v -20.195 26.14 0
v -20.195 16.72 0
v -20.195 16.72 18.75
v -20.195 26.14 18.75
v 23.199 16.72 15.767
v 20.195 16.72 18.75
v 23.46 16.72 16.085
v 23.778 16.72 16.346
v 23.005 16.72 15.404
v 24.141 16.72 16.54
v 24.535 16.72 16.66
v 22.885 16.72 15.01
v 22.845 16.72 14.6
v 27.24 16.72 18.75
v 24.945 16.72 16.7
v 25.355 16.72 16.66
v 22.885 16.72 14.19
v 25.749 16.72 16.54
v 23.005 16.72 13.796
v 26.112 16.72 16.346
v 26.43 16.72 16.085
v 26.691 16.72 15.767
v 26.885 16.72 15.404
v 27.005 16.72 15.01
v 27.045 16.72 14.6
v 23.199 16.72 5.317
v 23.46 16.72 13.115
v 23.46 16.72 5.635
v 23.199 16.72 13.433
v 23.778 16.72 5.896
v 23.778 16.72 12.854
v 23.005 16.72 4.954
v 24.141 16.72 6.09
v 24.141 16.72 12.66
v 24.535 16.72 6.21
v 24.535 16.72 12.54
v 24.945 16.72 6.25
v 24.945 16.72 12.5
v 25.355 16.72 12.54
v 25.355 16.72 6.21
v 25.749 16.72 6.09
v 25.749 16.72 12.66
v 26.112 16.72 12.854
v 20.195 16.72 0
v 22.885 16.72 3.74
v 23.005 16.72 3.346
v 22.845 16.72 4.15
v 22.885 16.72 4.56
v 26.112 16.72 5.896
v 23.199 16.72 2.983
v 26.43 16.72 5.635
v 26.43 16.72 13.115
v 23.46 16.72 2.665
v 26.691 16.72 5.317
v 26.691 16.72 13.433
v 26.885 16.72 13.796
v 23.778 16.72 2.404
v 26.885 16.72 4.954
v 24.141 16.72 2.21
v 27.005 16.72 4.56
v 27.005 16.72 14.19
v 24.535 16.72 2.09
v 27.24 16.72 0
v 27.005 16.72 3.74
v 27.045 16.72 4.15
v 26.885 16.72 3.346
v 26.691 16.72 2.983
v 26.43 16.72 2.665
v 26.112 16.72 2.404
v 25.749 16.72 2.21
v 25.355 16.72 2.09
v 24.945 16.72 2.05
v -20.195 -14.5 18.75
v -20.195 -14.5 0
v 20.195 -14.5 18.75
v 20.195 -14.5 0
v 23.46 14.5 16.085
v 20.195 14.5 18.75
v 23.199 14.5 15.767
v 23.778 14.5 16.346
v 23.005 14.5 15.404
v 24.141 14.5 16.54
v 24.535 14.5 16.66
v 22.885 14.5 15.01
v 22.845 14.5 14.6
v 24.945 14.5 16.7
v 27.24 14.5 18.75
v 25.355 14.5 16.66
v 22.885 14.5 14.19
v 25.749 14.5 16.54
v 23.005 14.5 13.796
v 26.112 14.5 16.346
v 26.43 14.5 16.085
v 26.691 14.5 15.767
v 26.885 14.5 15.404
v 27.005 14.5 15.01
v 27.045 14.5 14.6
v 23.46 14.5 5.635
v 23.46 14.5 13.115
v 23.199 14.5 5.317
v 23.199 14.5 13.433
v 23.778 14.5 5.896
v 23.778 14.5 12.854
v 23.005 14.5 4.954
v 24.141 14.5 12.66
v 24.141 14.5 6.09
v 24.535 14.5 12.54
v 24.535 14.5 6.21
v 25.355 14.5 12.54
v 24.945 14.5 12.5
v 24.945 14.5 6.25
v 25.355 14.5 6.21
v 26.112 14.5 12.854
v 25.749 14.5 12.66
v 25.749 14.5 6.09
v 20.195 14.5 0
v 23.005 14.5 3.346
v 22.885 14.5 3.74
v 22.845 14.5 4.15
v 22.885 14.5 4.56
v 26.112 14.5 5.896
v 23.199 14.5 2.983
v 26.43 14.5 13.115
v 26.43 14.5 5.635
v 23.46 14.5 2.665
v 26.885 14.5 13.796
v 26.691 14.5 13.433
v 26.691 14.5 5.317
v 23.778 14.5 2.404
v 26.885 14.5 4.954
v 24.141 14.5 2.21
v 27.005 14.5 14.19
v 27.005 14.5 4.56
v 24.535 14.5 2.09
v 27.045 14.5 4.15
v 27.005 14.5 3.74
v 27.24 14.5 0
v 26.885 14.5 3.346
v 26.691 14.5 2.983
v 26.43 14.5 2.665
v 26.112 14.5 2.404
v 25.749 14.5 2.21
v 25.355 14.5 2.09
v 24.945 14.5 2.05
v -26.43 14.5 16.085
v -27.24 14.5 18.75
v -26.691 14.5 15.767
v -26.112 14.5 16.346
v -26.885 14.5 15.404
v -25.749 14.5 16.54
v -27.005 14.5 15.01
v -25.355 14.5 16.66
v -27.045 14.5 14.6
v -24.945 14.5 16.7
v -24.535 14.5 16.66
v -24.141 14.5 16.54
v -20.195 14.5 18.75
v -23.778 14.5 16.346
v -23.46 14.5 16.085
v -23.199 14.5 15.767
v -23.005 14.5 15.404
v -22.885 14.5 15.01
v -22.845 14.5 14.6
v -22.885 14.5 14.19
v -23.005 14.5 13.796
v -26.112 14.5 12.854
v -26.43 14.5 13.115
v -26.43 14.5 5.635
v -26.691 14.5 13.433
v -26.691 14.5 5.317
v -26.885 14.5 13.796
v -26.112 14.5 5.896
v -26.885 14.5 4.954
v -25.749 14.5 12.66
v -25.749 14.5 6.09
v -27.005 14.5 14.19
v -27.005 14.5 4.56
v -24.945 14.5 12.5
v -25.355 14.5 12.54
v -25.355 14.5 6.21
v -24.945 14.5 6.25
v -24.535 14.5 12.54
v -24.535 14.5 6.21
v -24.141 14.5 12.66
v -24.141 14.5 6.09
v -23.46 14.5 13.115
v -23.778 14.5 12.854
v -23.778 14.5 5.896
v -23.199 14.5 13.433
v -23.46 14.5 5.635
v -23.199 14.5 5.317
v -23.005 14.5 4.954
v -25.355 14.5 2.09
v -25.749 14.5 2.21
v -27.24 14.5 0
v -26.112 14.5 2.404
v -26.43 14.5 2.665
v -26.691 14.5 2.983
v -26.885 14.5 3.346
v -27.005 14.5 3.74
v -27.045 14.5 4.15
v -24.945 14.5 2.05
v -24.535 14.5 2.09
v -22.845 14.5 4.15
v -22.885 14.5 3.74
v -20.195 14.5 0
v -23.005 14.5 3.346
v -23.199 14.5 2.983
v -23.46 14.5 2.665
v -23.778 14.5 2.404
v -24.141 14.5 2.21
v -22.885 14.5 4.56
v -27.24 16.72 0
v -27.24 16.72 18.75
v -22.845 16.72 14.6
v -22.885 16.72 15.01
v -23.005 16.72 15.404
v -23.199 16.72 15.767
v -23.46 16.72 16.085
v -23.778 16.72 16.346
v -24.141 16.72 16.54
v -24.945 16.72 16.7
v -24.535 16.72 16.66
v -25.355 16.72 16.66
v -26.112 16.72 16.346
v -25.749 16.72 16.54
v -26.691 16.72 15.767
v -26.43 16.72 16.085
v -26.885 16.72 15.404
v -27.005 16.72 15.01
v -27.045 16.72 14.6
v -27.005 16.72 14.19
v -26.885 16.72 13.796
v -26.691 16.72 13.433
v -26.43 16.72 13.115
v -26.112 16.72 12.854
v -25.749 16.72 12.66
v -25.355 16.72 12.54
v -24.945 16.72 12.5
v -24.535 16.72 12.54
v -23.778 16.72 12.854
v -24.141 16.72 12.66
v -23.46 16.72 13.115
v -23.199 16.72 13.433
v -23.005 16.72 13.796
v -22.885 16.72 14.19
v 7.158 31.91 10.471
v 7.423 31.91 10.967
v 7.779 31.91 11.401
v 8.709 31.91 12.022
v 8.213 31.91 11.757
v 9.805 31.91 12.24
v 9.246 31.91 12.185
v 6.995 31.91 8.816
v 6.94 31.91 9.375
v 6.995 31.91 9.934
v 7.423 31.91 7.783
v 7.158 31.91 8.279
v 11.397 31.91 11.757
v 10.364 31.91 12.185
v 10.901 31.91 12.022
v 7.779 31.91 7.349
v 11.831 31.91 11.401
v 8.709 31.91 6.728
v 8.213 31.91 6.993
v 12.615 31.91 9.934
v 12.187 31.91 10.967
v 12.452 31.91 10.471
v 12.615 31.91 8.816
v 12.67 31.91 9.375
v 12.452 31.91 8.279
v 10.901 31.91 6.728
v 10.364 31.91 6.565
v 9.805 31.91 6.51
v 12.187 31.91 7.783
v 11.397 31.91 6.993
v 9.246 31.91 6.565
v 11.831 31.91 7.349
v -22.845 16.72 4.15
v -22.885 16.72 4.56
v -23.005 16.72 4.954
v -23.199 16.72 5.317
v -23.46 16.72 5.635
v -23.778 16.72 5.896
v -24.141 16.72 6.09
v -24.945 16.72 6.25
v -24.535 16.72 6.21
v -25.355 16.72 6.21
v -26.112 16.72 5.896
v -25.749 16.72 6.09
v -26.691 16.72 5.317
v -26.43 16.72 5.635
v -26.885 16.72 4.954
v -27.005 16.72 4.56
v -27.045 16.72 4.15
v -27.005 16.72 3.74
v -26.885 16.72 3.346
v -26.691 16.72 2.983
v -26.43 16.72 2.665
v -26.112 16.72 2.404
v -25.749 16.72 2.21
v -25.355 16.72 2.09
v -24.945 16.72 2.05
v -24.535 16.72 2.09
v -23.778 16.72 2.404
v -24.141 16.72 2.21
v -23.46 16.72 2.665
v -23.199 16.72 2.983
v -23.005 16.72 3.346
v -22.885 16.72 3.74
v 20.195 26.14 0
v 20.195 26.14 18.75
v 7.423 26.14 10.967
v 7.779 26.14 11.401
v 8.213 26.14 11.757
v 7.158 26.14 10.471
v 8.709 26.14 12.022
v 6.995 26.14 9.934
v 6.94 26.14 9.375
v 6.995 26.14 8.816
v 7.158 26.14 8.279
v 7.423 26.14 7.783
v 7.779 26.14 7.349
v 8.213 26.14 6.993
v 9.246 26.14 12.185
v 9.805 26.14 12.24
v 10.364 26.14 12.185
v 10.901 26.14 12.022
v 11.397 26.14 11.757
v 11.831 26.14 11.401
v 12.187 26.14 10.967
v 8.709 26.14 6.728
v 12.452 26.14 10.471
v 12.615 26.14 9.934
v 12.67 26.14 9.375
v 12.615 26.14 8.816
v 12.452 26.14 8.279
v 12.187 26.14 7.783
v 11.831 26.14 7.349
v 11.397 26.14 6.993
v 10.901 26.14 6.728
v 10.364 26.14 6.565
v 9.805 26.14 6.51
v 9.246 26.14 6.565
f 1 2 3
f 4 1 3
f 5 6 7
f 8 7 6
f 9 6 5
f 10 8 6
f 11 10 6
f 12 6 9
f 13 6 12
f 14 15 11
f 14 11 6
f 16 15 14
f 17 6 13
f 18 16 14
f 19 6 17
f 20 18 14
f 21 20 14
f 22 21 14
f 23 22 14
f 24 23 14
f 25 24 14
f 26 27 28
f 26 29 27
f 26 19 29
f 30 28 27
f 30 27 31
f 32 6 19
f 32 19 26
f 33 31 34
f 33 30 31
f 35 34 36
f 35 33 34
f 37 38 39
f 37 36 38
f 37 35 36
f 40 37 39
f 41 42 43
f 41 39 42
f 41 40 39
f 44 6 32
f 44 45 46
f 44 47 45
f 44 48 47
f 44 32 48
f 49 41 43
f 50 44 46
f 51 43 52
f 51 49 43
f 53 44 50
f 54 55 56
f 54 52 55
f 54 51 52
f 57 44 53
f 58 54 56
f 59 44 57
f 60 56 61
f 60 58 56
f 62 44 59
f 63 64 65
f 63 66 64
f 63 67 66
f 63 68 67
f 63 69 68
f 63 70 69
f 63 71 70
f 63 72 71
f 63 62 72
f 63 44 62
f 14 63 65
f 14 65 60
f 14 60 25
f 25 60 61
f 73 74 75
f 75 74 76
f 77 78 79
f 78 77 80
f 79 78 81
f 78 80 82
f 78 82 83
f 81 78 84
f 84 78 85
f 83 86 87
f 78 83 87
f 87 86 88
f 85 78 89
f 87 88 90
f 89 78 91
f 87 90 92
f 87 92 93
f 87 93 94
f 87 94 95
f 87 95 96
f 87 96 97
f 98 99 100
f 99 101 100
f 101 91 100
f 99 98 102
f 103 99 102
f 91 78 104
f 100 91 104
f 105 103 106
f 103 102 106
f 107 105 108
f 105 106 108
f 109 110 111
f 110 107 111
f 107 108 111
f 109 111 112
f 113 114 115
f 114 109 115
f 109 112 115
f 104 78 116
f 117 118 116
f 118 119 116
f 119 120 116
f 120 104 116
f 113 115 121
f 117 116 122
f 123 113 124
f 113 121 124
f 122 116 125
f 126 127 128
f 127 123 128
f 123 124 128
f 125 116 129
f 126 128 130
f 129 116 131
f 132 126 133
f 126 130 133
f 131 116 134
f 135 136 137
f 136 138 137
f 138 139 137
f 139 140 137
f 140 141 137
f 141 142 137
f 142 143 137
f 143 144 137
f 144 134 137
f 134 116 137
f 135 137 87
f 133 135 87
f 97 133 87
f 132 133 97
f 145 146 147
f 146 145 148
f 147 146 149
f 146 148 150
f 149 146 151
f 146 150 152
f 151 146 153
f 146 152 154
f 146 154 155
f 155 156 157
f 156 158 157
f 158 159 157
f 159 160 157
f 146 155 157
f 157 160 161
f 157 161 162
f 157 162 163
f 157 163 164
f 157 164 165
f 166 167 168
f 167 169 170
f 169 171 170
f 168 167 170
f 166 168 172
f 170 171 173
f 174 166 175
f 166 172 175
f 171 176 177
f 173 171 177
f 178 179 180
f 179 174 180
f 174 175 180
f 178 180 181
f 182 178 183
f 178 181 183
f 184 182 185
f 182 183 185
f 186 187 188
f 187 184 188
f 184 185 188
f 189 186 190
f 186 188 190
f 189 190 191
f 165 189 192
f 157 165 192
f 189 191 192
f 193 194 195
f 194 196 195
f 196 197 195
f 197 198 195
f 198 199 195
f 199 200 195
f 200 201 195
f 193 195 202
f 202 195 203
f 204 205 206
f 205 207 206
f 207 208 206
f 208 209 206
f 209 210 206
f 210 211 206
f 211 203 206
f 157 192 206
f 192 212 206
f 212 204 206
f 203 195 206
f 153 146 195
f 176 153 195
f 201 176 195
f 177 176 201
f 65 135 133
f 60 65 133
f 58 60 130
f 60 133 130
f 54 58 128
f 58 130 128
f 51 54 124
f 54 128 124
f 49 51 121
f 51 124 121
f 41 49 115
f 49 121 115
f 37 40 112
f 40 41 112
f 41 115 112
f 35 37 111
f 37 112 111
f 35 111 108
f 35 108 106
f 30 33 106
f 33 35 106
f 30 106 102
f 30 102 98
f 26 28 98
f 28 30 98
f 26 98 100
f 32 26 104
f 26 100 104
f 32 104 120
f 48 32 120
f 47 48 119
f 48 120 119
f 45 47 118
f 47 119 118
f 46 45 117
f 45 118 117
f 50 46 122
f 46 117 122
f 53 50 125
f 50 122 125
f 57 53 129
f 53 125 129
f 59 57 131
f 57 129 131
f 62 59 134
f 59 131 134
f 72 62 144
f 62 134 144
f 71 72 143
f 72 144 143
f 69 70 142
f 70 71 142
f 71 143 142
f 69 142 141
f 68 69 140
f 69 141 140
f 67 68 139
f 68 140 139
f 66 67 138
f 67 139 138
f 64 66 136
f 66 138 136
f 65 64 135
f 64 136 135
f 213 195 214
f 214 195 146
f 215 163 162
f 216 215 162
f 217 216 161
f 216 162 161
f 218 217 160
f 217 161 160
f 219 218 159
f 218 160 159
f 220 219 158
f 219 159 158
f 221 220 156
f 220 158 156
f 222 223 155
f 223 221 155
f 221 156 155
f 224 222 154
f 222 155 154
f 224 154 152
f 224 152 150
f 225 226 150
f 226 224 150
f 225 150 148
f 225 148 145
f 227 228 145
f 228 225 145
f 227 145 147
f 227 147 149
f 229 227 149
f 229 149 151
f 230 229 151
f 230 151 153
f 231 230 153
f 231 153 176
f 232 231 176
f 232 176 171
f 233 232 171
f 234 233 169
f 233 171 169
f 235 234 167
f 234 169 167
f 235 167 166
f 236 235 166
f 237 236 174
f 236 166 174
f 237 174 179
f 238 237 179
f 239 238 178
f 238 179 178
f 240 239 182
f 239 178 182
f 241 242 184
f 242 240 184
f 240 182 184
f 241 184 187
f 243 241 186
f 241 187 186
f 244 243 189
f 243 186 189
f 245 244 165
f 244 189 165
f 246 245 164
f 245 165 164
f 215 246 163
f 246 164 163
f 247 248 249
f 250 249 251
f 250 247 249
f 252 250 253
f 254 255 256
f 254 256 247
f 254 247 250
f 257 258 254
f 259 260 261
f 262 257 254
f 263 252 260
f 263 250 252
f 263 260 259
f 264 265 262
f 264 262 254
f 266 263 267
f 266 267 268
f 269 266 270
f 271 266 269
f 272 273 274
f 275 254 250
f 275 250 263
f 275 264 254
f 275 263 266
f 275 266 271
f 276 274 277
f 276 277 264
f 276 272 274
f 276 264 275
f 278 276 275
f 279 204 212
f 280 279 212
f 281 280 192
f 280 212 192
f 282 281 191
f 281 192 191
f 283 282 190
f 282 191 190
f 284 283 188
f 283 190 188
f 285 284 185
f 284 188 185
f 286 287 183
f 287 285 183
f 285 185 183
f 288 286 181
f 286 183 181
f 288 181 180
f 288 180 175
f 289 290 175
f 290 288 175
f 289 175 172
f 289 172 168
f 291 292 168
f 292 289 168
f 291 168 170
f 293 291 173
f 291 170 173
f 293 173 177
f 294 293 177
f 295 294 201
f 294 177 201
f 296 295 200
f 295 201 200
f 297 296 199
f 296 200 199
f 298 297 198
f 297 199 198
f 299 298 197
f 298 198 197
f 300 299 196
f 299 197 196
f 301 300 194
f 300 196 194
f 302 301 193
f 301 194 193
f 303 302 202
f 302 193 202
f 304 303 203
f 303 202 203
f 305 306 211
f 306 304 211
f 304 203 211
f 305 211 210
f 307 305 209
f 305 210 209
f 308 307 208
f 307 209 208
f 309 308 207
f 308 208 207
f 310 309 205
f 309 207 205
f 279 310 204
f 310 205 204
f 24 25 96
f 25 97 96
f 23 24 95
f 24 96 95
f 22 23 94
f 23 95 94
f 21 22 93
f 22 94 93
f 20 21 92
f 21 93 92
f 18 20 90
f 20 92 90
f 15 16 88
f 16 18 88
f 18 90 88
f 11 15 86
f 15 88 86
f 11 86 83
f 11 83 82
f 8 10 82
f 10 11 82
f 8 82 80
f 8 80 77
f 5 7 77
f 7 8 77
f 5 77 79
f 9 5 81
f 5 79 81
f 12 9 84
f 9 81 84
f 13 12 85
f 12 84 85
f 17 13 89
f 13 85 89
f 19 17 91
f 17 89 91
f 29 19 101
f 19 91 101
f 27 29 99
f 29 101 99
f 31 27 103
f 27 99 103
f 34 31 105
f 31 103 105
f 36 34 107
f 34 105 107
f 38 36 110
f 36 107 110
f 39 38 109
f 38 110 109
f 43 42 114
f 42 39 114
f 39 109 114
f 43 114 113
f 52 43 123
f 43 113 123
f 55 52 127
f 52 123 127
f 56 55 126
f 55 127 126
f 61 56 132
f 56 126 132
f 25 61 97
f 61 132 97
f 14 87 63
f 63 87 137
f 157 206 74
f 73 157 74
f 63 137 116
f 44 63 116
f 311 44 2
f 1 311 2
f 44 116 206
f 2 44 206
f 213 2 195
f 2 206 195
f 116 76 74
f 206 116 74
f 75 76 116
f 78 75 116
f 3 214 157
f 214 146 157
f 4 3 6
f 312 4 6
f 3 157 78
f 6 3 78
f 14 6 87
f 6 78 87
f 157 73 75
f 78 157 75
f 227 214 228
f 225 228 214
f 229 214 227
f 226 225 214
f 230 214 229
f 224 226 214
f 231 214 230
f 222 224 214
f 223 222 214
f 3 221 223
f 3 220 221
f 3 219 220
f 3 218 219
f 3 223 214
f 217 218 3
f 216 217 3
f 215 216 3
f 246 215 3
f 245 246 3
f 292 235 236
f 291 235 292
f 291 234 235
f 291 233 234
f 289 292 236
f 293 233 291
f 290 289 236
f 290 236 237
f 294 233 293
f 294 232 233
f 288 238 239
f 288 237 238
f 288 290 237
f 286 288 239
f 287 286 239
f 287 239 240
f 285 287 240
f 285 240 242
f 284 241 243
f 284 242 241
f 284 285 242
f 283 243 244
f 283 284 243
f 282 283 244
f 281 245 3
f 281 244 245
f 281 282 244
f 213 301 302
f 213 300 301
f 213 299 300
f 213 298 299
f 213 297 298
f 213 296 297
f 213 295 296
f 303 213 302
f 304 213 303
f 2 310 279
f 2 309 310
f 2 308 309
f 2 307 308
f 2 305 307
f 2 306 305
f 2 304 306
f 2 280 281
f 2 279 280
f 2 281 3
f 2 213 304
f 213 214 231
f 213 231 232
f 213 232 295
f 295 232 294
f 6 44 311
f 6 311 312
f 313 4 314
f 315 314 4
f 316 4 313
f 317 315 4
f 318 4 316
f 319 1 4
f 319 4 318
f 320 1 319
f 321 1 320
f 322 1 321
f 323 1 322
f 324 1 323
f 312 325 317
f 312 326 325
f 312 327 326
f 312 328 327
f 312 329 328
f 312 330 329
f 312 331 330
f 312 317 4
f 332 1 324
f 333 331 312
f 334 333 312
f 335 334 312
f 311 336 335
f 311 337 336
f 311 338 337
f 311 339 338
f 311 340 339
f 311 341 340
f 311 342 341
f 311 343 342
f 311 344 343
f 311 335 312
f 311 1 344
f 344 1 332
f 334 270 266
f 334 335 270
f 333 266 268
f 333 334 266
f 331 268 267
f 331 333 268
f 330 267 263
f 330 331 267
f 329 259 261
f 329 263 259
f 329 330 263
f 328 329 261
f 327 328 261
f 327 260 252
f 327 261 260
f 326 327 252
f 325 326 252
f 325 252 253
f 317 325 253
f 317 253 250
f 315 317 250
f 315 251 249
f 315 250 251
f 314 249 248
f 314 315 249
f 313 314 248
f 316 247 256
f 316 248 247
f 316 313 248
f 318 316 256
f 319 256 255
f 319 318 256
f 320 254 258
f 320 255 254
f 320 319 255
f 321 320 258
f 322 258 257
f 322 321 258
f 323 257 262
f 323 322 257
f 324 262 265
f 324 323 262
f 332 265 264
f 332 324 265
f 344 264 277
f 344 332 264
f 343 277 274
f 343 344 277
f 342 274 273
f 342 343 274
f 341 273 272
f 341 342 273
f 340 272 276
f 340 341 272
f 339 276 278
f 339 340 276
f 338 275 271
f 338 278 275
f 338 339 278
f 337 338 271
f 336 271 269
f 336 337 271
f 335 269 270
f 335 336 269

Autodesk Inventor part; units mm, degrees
ref_plane "YZ Plane" through (0, 0, 0) normal (1, 0, 0) x (0, 1, 0)
ref_plane "XZ Plane" through (0, 0, 0) normal (0, 1, 0) x (-1, 0, 0)
ref_plane "XY Plane" through (0, 0, 0) normal (0, 0, 1) x (1, 0, 0)
sketch "Sketch2" plane through (0, 0, 0) normal (0, 0, 1) x (1, 0, 0)
  line L0 (-20.195, -14.5) -> (20.195, -14.5)
  line L1 (20.195, -14.5) -> (20.195, 14.5)
  line L2 (20.195, 14.5) -> (-20.195, 14.5)
  line L3 (-20.195, 14.5) -> (-20.195, -14.5)
  line L4 (-20.195, -14.5) -> (20.195, 14.5) construction
  line L5 (20.195, -14.5) -> (-20.195, 14.5) construction
  point P0 (0, 0)
  dimension "d0" = 40.39
  dimension "d1" = 29
extrude "Extrusion1" add sketch "Sketch2" along normal blind 18.75
sketch "Sketch3" plane through (-20.195, 14.5, 0) normal (0, 1, 0) x (1, 0, 0)
  line L0 (40.39, 0) -> (0, 0) construction
  line L1 (0, 0) -> (0, -18.75) construction
  line L2 (40.39, -18.75) -> (0, -18.75) construction
  line L3 (40.39, 0) -> (40.39, -18.75) construction
  line L4 (0, 0) -> (40.39, -18.75) construction
  line L5 (-7.045, -18.75) -> (47.435, -18.75)
  line L6 (47.435, -18.75) -> (47.435, 0)
  line L7 (47.435, 0) -> (-7.045, 0)
  line L8 (-7.045, 0) -> (-7.045, -18.75)
  line L9 (-7.045, -18.75) -> (47.435, 0) construction
  line L10 (47.435, -18.75) -> (-7.045, 0) construction
  line L11 (-7.045, -9.375) -> (47.435, -9.375) construction
  circle A0 centre (-4.75, -4.15) radius 2.1
  line L12 (20.195, -9.375) -> (20.195, -3.4775) construction
  circle A1 centre (-4.75, -14.6) radius 2.1
  circle A2 centre (45.14, -4.15) radius 2.1
  circle A3 centre (45.14, -14.6) radius 2.1
  point P0 (20.195, 0)
  dimension "d4" = 54.48
  dimension "d5" = 4.2
  dimension "d6" = 4.15
  dimension "d7" = 4.75
extrude "Extrusion2" add sketch "Sketch3" along normal blind 2.22
sketch "Sketch4" plane through (-20.195, 16.72, 0) normal (0, 1, 0) x (1, 0, 0)
  line L0 (0, 0) -> (0, -18.75) projected
  line L1 (40.39, 0) -> (40.39, -18.75) projected
  line L2 (47.435, 0) -> (-7.045, 0) projected
  line L3 (-7.045, -18.75) -> (47.435, -18.75) projected
  point P0 (20.195, 0)
extrude "Extrusion3" add sketch "Sketch4" along normal blind 9.42
sketch "Sketch5" plane through (-20.195, 26.14, 0) normal (0, 1, 0) x (1, 0, 0)
  line L0 (40.39, -18.75) -> (40.39, 0) projected
  line L1 (40.39, 0) -> (0, 0) projected
  line L2 (0, 0) -> (0, -18.75) projected
  line L3 (0, -18.75) -> (40.39, -18.75) projected
  line L4 (40.39, -9.375) -> (0, -9.375) construction
  circle A0 centre (30, -9.375) radius 2.865
  point P0 (20.195, 0)
  dimension "d12" = 30
  dimension "d13" = 5.73
extrude "Extrusion4" add sketch "Sketch5" along normal blind 5.77 contours A0
ref_plane "Work Plane1" through (0, 0, 9.375) normal (0, 0, 1) x (1, 0, 0)
properties part number "40kgServo"
